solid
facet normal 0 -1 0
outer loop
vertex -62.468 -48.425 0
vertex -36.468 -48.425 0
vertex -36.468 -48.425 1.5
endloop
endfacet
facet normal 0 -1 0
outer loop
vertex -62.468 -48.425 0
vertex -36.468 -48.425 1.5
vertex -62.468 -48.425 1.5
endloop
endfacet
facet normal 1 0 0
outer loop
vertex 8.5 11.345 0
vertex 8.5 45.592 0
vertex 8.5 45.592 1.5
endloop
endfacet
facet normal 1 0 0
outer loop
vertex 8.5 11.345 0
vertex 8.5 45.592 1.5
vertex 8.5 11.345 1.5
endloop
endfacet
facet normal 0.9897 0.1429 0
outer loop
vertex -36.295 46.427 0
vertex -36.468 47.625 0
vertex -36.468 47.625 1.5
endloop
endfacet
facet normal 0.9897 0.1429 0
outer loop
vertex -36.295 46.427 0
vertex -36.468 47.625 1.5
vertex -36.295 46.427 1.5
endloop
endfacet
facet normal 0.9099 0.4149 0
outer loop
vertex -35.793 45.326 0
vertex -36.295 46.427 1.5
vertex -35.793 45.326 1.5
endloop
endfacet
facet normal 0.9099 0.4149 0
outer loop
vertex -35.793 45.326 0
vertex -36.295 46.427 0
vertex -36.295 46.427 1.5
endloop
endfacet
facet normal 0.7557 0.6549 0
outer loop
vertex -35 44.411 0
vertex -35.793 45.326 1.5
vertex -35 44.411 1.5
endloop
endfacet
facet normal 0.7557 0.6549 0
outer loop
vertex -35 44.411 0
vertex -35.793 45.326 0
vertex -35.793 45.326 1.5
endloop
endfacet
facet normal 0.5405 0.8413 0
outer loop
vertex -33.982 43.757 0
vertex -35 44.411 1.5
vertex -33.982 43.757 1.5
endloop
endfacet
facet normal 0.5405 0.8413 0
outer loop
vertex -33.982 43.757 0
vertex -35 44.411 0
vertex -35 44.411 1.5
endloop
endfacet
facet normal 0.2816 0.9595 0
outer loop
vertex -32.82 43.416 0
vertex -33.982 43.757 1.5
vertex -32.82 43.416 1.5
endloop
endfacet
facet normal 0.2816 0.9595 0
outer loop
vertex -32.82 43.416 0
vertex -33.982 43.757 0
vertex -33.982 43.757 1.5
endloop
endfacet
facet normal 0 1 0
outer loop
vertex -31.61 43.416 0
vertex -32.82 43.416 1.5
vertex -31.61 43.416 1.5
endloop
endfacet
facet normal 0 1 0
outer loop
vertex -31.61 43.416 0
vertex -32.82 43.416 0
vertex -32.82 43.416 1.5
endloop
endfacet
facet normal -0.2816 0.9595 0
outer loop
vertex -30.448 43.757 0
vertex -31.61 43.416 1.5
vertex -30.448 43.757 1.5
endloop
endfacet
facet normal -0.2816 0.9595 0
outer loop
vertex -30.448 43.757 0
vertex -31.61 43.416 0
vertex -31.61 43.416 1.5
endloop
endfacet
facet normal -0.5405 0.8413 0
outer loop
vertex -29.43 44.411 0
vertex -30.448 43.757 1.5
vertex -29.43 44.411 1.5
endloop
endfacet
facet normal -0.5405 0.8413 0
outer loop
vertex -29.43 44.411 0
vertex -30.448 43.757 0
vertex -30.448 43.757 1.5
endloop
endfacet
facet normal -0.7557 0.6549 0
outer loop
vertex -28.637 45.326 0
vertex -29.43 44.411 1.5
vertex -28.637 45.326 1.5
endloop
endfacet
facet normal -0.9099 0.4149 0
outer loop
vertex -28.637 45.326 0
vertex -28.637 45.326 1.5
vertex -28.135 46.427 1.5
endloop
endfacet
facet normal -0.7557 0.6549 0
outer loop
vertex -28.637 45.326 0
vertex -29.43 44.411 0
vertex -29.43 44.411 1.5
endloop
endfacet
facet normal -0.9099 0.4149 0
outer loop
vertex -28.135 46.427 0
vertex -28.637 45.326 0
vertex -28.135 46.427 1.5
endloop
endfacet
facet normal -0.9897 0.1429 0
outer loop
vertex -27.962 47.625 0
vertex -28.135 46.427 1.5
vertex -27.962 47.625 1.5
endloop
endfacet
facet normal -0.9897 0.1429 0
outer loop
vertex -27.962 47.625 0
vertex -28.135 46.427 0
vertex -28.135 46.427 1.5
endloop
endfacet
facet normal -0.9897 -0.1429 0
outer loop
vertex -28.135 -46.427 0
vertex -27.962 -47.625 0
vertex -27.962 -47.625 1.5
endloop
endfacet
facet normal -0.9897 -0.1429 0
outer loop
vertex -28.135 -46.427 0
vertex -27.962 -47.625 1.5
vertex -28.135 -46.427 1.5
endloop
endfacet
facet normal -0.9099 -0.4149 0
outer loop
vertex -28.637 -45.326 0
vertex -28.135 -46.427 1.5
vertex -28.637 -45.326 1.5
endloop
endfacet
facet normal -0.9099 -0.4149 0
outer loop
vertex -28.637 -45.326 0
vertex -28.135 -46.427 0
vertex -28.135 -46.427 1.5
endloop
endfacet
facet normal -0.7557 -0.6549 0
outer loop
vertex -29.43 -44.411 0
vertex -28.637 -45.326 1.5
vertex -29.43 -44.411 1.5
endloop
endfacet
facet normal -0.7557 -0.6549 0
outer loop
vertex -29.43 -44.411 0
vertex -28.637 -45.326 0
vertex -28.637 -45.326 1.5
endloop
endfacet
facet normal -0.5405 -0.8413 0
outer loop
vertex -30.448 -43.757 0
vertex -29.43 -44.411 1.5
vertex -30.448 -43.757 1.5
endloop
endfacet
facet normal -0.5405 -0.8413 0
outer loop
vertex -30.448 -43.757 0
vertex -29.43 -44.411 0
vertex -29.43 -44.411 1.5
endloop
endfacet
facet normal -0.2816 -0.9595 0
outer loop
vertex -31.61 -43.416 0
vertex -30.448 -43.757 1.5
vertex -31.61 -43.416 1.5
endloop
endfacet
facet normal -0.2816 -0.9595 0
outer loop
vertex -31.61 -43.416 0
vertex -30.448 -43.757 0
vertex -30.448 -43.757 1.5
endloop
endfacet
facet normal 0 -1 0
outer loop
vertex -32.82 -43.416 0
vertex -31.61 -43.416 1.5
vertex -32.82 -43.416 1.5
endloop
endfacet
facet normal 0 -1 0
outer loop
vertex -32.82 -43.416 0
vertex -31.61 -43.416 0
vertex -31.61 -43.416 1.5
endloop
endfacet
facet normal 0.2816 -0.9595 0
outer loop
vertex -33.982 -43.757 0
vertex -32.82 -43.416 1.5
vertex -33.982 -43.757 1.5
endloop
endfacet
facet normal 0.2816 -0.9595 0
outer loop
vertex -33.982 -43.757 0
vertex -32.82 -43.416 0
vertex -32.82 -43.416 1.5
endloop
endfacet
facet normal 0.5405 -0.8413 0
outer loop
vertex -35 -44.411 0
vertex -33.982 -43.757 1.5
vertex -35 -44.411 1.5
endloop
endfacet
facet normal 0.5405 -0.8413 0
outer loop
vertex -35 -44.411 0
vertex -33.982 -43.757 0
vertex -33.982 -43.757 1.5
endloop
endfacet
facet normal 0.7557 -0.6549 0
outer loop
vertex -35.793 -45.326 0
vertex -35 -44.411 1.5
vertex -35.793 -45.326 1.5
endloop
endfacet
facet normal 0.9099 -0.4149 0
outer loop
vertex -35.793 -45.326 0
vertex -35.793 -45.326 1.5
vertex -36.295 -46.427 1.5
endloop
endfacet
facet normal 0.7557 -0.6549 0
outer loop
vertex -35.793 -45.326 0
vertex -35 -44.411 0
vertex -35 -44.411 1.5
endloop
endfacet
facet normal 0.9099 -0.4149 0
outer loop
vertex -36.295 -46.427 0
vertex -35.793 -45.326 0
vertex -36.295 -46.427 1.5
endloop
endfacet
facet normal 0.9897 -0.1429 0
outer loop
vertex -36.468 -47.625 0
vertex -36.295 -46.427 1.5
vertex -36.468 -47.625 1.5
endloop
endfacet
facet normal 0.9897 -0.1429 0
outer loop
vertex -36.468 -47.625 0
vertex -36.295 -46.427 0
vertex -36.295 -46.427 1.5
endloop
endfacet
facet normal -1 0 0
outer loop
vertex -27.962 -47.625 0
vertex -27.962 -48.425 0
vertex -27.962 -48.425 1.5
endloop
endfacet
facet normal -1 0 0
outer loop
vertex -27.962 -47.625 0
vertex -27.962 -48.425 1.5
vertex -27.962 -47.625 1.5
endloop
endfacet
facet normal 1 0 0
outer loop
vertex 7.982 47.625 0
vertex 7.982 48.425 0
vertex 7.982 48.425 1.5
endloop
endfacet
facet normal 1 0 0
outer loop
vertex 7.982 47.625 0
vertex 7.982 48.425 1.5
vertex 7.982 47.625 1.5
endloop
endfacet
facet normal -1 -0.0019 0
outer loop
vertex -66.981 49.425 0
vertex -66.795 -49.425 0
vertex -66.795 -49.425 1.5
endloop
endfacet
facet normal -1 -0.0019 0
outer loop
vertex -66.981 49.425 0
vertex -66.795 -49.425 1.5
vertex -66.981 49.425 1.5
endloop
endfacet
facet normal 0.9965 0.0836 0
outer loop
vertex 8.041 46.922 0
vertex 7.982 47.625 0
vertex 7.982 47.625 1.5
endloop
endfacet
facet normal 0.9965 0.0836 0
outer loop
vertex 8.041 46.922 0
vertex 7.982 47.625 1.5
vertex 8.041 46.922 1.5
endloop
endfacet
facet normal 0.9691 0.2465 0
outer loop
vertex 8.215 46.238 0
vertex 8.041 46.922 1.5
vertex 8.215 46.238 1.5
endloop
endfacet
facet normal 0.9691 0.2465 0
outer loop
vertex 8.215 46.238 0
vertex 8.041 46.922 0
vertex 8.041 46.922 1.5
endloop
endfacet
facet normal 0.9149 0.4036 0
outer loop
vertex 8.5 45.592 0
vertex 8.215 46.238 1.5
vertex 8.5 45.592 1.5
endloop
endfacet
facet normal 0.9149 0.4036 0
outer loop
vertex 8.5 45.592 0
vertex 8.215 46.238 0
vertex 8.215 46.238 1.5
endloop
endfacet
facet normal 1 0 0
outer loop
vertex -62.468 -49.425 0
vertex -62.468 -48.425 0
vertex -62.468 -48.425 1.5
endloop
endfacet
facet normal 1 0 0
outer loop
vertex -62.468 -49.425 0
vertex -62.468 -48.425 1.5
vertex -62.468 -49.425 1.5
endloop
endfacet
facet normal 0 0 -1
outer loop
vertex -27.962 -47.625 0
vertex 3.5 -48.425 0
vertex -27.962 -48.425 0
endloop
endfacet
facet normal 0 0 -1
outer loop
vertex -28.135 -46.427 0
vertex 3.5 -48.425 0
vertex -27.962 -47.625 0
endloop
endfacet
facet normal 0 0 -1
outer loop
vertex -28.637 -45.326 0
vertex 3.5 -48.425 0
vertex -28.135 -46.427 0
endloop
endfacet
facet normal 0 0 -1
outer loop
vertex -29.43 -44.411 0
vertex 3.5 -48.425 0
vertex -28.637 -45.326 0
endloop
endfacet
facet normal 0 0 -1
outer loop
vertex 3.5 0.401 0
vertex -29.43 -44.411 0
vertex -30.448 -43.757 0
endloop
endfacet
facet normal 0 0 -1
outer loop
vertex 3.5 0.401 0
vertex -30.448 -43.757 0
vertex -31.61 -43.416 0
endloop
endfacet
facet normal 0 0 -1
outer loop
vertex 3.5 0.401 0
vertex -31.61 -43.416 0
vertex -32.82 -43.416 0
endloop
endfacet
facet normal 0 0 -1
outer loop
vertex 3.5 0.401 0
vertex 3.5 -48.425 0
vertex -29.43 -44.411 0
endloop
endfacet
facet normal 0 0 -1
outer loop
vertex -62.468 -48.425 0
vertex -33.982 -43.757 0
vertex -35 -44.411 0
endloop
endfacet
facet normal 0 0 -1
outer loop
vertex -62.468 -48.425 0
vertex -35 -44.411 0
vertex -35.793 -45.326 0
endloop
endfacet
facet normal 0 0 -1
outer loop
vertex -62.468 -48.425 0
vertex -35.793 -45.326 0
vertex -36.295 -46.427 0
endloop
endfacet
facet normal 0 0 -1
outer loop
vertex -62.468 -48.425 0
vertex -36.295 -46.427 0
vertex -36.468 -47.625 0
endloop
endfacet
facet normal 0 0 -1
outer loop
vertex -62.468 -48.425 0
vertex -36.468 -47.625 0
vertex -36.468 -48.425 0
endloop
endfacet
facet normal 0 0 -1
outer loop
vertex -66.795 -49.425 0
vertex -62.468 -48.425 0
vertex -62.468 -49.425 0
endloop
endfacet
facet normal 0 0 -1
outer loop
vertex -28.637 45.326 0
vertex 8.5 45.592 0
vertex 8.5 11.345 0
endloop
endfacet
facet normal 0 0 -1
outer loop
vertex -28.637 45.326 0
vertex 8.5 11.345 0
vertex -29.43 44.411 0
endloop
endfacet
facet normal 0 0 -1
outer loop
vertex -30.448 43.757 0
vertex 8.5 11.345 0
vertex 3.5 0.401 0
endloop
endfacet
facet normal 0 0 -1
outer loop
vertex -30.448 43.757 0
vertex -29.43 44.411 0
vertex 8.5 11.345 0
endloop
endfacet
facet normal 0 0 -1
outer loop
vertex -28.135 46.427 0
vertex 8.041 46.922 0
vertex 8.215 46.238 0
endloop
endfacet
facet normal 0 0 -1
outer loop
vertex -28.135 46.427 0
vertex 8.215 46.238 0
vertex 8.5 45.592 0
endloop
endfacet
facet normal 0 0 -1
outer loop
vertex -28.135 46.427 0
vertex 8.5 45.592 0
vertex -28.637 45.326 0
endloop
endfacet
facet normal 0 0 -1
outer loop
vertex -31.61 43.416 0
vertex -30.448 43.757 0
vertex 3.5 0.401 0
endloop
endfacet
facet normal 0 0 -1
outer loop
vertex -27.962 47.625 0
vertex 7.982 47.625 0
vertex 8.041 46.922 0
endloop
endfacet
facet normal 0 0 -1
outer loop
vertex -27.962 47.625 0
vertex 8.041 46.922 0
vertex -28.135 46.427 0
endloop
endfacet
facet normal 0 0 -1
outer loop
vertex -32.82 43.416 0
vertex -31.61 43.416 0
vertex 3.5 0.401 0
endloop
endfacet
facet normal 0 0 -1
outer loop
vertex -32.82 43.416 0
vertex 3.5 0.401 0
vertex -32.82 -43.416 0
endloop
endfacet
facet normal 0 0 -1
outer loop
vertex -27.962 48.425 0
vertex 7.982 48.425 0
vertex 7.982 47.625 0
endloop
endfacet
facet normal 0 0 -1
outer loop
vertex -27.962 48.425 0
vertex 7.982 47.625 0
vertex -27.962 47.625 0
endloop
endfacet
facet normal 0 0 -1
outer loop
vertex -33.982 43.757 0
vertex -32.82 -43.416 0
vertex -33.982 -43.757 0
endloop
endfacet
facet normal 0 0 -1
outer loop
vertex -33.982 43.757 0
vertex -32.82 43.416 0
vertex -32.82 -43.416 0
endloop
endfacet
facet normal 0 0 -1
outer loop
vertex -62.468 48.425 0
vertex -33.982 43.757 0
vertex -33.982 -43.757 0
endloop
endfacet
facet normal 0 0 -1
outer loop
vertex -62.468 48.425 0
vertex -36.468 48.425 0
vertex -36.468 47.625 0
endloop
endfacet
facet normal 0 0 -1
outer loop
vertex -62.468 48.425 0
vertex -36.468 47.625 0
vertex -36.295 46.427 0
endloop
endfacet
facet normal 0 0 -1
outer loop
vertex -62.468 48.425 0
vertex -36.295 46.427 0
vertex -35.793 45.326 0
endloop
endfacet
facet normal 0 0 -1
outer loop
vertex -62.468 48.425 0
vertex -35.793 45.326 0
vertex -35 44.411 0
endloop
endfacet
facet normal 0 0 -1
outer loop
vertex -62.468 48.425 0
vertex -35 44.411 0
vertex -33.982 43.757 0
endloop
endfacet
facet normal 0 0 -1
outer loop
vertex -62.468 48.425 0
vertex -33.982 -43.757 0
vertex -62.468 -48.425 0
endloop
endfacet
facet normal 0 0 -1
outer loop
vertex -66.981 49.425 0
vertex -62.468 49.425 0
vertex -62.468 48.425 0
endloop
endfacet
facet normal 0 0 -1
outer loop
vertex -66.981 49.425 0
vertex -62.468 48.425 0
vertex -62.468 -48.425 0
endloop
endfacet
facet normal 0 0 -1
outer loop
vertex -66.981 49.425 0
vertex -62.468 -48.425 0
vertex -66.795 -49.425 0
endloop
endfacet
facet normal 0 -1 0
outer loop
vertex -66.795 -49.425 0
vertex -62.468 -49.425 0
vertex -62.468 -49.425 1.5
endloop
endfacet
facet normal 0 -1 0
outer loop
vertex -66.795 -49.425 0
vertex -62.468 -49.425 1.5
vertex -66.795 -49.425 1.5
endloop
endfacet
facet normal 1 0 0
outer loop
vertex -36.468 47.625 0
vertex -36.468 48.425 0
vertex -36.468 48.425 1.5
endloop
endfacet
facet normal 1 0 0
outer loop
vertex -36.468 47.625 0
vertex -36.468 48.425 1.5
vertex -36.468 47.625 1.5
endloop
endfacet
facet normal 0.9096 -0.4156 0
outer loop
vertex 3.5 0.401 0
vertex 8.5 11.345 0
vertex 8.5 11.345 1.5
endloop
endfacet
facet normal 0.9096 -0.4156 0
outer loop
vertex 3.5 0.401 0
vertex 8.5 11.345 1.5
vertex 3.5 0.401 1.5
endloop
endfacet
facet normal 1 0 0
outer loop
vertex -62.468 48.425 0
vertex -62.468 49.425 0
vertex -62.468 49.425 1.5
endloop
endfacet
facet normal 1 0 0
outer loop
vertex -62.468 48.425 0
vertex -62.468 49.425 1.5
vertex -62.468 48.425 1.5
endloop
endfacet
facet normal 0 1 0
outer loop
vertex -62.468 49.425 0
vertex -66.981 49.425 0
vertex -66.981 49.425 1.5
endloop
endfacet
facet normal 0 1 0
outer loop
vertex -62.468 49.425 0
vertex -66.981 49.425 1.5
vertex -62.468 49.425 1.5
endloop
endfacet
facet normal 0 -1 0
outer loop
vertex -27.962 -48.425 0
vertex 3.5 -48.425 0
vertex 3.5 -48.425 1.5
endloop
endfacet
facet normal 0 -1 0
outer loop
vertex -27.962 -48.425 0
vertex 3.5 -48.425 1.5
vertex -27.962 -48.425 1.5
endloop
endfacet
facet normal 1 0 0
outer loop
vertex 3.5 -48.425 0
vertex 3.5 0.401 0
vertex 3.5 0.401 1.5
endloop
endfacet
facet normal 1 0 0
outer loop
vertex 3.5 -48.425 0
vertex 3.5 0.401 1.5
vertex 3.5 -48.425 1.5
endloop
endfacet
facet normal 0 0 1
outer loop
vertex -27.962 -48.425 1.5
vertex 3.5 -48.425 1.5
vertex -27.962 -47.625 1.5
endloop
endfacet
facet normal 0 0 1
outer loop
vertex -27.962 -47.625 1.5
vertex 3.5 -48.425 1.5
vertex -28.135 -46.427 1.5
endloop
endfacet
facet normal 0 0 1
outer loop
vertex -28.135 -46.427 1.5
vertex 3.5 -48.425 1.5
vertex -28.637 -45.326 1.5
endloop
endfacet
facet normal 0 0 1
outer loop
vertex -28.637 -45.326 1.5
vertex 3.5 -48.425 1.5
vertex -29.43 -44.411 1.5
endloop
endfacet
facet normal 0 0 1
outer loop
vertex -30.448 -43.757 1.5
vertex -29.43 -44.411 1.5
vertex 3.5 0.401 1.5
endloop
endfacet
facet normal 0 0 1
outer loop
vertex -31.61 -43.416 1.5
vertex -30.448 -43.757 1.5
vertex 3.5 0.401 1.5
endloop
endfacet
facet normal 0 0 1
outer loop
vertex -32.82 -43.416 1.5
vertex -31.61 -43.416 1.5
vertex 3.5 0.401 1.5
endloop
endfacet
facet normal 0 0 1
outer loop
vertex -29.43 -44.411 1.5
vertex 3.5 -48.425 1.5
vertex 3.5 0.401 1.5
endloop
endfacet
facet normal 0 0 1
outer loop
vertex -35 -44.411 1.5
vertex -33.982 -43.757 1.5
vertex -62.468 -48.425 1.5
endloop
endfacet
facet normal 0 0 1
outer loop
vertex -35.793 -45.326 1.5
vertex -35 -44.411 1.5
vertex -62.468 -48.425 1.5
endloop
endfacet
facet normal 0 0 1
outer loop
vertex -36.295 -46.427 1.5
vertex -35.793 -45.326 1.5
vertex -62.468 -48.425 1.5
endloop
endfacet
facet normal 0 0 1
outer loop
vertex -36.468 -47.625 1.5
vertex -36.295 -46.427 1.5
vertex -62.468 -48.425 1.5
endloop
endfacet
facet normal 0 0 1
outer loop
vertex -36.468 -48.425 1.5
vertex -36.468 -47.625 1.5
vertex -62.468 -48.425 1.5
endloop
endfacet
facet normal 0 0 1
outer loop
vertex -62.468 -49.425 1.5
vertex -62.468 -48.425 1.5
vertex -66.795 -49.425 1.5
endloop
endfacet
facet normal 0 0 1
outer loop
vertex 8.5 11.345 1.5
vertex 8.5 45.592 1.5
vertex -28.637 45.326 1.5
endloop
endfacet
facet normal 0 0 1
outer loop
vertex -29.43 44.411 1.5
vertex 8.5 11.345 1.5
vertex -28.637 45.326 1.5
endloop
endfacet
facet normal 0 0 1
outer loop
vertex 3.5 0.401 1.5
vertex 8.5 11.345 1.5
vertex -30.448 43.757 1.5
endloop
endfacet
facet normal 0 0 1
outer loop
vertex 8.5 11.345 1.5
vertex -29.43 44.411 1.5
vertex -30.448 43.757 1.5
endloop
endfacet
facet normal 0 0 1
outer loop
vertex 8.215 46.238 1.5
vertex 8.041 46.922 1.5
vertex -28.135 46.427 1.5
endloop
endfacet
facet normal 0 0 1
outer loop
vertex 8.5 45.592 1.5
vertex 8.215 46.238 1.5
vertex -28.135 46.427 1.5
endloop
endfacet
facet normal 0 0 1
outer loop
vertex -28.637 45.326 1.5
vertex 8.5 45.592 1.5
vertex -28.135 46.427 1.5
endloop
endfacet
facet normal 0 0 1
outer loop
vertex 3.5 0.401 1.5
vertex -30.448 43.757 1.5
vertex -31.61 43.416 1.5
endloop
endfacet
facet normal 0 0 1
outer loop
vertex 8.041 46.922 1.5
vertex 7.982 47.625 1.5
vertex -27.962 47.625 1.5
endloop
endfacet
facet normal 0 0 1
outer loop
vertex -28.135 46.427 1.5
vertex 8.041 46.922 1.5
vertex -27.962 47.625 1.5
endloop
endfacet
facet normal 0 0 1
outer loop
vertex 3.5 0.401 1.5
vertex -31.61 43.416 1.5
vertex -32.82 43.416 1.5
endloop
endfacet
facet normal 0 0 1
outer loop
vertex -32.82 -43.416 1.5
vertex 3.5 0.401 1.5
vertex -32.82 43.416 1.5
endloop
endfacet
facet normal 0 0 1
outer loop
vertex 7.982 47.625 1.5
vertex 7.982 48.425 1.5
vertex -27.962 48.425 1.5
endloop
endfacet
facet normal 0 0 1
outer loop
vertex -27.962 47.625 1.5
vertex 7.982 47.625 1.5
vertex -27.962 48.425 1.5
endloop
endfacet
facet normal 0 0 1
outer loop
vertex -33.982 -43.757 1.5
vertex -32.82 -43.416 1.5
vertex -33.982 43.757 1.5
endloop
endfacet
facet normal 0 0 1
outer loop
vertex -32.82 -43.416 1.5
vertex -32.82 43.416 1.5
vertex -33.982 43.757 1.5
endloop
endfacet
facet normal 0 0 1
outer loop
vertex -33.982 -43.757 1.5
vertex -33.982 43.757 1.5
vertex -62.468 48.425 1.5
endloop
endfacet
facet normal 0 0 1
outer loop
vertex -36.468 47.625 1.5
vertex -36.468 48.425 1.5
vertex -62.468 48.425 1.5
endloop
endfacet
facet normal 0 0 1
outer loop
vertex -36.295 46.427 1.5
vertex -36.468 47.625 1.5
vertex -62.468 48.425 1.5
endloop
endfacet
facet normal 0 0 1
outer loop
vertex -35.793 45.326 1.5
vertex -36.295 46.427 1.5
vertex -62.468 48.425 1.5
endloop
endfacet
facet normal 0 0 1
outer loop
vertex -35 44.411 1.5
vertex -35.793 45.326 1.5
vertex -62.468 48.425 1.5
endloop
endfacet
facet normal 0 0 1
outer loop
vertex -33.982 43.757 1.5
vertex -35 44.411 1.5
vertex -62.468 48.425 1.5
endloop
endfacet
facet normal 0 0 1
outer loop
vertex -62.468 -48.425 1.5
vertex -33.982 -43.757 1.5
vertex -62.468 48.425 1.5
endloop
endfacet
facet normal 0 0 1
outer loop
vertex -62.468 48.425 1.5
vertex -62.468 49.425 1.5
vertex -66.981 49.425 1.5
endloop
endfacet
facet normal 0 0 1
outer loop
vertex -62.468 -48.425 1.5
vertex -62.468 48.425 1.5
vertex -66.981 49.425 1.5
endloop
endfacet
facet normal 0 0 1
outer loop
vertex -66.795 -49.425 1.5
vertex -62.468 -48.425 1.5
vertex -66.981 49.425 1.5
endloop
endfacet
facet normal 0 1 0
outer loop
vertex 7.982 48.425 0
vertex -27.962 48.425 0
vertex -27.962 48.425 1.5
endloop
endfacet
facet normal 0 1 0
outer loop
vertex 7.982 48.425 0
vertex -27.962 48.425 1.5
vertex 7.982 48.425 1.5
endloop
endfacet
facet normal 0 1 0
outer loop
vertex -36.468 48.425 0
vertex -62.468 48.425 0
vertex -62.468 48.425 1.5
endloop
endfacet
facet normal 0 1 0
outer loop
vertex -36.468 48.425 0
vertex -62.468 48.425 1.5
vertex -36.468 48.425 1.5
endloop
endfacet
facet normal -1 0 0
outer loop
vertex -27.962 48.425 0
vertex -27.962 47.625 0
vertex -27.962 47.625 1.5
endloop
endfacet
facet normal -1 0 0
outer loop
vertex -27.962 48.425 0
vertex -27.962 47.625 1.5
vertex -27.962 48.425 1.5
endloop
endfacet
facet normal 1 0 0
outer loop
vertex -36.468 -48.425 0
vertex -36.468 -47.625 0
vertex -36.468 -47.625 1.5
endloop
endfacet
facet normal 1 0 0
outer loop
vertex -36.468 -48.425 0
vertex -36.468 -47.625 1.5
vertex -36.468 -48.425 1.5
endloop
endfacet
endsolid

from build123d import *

# Parameters (mm, degrees)
BOSS_EXTRUDE1_DEPTH = 1.5


with BuildPart() as part:
    # Sketch1 → Boss-Extrude1 (new body)
    with BuildSketch(Plane.XY):
        with BuildLine():
            Line((-66.795, -49.425), (-66.9813, 49.425))
            Line((-66.9813, 49.425), (-62.4676, 49.425))
            Line((-62.4676, 49.425), (-62.4676, 48.425))
            Line((-62.4676, 48.425), (-36.4676, 48.425))
            Line((-36.4676, 48.425), (-36.4676, 47.625))
            ThreePointArc((-36.4676, 47.625), (-32.215, 43.3724), (-27.9624, 47.625))
            Line((-27.9624, 47.625), (-27.9624, 48.425))
            Line((-27.9624, 48.425), (7.9824, 48.425))
            Line((7.9824, 48.425), (7.9824, 47.625))
            ThreePointArc((7.9824, 47.625), (8.113831006, 46.575918078), (8.5, 45.591682081))
            Line((8.5, 45.591682081), (8.5, 11.344715994))
            Line((8.5, 11.344715994), (3.5, 0.401446139))
            Line((3.5, 0.401446139), (3.5, -48.425))
            Line((3.5, -48.425), (-27.9624, -48.425))
            Line((-27.9624, -48.425), (-27.9624, -47.625))
            ThreePointArc((-27.9624, -47.625), (-32.215, -43.3724), (-36.4676, -47.625))
            Line((-36.4676, -47.625), (-36.4676, -48.425))
            Line((-36.4676, -48.425), (-62.4676, -48.425))
            Line((-62.4676, -48.425), (-62.4676, -49.425))
            Line((-62.4676, -49.425), (-66.795, -49.425))
        make_face()
    extrude(amount=BOSS_EXTRUDE1_DEPTH)


solid = part.part
